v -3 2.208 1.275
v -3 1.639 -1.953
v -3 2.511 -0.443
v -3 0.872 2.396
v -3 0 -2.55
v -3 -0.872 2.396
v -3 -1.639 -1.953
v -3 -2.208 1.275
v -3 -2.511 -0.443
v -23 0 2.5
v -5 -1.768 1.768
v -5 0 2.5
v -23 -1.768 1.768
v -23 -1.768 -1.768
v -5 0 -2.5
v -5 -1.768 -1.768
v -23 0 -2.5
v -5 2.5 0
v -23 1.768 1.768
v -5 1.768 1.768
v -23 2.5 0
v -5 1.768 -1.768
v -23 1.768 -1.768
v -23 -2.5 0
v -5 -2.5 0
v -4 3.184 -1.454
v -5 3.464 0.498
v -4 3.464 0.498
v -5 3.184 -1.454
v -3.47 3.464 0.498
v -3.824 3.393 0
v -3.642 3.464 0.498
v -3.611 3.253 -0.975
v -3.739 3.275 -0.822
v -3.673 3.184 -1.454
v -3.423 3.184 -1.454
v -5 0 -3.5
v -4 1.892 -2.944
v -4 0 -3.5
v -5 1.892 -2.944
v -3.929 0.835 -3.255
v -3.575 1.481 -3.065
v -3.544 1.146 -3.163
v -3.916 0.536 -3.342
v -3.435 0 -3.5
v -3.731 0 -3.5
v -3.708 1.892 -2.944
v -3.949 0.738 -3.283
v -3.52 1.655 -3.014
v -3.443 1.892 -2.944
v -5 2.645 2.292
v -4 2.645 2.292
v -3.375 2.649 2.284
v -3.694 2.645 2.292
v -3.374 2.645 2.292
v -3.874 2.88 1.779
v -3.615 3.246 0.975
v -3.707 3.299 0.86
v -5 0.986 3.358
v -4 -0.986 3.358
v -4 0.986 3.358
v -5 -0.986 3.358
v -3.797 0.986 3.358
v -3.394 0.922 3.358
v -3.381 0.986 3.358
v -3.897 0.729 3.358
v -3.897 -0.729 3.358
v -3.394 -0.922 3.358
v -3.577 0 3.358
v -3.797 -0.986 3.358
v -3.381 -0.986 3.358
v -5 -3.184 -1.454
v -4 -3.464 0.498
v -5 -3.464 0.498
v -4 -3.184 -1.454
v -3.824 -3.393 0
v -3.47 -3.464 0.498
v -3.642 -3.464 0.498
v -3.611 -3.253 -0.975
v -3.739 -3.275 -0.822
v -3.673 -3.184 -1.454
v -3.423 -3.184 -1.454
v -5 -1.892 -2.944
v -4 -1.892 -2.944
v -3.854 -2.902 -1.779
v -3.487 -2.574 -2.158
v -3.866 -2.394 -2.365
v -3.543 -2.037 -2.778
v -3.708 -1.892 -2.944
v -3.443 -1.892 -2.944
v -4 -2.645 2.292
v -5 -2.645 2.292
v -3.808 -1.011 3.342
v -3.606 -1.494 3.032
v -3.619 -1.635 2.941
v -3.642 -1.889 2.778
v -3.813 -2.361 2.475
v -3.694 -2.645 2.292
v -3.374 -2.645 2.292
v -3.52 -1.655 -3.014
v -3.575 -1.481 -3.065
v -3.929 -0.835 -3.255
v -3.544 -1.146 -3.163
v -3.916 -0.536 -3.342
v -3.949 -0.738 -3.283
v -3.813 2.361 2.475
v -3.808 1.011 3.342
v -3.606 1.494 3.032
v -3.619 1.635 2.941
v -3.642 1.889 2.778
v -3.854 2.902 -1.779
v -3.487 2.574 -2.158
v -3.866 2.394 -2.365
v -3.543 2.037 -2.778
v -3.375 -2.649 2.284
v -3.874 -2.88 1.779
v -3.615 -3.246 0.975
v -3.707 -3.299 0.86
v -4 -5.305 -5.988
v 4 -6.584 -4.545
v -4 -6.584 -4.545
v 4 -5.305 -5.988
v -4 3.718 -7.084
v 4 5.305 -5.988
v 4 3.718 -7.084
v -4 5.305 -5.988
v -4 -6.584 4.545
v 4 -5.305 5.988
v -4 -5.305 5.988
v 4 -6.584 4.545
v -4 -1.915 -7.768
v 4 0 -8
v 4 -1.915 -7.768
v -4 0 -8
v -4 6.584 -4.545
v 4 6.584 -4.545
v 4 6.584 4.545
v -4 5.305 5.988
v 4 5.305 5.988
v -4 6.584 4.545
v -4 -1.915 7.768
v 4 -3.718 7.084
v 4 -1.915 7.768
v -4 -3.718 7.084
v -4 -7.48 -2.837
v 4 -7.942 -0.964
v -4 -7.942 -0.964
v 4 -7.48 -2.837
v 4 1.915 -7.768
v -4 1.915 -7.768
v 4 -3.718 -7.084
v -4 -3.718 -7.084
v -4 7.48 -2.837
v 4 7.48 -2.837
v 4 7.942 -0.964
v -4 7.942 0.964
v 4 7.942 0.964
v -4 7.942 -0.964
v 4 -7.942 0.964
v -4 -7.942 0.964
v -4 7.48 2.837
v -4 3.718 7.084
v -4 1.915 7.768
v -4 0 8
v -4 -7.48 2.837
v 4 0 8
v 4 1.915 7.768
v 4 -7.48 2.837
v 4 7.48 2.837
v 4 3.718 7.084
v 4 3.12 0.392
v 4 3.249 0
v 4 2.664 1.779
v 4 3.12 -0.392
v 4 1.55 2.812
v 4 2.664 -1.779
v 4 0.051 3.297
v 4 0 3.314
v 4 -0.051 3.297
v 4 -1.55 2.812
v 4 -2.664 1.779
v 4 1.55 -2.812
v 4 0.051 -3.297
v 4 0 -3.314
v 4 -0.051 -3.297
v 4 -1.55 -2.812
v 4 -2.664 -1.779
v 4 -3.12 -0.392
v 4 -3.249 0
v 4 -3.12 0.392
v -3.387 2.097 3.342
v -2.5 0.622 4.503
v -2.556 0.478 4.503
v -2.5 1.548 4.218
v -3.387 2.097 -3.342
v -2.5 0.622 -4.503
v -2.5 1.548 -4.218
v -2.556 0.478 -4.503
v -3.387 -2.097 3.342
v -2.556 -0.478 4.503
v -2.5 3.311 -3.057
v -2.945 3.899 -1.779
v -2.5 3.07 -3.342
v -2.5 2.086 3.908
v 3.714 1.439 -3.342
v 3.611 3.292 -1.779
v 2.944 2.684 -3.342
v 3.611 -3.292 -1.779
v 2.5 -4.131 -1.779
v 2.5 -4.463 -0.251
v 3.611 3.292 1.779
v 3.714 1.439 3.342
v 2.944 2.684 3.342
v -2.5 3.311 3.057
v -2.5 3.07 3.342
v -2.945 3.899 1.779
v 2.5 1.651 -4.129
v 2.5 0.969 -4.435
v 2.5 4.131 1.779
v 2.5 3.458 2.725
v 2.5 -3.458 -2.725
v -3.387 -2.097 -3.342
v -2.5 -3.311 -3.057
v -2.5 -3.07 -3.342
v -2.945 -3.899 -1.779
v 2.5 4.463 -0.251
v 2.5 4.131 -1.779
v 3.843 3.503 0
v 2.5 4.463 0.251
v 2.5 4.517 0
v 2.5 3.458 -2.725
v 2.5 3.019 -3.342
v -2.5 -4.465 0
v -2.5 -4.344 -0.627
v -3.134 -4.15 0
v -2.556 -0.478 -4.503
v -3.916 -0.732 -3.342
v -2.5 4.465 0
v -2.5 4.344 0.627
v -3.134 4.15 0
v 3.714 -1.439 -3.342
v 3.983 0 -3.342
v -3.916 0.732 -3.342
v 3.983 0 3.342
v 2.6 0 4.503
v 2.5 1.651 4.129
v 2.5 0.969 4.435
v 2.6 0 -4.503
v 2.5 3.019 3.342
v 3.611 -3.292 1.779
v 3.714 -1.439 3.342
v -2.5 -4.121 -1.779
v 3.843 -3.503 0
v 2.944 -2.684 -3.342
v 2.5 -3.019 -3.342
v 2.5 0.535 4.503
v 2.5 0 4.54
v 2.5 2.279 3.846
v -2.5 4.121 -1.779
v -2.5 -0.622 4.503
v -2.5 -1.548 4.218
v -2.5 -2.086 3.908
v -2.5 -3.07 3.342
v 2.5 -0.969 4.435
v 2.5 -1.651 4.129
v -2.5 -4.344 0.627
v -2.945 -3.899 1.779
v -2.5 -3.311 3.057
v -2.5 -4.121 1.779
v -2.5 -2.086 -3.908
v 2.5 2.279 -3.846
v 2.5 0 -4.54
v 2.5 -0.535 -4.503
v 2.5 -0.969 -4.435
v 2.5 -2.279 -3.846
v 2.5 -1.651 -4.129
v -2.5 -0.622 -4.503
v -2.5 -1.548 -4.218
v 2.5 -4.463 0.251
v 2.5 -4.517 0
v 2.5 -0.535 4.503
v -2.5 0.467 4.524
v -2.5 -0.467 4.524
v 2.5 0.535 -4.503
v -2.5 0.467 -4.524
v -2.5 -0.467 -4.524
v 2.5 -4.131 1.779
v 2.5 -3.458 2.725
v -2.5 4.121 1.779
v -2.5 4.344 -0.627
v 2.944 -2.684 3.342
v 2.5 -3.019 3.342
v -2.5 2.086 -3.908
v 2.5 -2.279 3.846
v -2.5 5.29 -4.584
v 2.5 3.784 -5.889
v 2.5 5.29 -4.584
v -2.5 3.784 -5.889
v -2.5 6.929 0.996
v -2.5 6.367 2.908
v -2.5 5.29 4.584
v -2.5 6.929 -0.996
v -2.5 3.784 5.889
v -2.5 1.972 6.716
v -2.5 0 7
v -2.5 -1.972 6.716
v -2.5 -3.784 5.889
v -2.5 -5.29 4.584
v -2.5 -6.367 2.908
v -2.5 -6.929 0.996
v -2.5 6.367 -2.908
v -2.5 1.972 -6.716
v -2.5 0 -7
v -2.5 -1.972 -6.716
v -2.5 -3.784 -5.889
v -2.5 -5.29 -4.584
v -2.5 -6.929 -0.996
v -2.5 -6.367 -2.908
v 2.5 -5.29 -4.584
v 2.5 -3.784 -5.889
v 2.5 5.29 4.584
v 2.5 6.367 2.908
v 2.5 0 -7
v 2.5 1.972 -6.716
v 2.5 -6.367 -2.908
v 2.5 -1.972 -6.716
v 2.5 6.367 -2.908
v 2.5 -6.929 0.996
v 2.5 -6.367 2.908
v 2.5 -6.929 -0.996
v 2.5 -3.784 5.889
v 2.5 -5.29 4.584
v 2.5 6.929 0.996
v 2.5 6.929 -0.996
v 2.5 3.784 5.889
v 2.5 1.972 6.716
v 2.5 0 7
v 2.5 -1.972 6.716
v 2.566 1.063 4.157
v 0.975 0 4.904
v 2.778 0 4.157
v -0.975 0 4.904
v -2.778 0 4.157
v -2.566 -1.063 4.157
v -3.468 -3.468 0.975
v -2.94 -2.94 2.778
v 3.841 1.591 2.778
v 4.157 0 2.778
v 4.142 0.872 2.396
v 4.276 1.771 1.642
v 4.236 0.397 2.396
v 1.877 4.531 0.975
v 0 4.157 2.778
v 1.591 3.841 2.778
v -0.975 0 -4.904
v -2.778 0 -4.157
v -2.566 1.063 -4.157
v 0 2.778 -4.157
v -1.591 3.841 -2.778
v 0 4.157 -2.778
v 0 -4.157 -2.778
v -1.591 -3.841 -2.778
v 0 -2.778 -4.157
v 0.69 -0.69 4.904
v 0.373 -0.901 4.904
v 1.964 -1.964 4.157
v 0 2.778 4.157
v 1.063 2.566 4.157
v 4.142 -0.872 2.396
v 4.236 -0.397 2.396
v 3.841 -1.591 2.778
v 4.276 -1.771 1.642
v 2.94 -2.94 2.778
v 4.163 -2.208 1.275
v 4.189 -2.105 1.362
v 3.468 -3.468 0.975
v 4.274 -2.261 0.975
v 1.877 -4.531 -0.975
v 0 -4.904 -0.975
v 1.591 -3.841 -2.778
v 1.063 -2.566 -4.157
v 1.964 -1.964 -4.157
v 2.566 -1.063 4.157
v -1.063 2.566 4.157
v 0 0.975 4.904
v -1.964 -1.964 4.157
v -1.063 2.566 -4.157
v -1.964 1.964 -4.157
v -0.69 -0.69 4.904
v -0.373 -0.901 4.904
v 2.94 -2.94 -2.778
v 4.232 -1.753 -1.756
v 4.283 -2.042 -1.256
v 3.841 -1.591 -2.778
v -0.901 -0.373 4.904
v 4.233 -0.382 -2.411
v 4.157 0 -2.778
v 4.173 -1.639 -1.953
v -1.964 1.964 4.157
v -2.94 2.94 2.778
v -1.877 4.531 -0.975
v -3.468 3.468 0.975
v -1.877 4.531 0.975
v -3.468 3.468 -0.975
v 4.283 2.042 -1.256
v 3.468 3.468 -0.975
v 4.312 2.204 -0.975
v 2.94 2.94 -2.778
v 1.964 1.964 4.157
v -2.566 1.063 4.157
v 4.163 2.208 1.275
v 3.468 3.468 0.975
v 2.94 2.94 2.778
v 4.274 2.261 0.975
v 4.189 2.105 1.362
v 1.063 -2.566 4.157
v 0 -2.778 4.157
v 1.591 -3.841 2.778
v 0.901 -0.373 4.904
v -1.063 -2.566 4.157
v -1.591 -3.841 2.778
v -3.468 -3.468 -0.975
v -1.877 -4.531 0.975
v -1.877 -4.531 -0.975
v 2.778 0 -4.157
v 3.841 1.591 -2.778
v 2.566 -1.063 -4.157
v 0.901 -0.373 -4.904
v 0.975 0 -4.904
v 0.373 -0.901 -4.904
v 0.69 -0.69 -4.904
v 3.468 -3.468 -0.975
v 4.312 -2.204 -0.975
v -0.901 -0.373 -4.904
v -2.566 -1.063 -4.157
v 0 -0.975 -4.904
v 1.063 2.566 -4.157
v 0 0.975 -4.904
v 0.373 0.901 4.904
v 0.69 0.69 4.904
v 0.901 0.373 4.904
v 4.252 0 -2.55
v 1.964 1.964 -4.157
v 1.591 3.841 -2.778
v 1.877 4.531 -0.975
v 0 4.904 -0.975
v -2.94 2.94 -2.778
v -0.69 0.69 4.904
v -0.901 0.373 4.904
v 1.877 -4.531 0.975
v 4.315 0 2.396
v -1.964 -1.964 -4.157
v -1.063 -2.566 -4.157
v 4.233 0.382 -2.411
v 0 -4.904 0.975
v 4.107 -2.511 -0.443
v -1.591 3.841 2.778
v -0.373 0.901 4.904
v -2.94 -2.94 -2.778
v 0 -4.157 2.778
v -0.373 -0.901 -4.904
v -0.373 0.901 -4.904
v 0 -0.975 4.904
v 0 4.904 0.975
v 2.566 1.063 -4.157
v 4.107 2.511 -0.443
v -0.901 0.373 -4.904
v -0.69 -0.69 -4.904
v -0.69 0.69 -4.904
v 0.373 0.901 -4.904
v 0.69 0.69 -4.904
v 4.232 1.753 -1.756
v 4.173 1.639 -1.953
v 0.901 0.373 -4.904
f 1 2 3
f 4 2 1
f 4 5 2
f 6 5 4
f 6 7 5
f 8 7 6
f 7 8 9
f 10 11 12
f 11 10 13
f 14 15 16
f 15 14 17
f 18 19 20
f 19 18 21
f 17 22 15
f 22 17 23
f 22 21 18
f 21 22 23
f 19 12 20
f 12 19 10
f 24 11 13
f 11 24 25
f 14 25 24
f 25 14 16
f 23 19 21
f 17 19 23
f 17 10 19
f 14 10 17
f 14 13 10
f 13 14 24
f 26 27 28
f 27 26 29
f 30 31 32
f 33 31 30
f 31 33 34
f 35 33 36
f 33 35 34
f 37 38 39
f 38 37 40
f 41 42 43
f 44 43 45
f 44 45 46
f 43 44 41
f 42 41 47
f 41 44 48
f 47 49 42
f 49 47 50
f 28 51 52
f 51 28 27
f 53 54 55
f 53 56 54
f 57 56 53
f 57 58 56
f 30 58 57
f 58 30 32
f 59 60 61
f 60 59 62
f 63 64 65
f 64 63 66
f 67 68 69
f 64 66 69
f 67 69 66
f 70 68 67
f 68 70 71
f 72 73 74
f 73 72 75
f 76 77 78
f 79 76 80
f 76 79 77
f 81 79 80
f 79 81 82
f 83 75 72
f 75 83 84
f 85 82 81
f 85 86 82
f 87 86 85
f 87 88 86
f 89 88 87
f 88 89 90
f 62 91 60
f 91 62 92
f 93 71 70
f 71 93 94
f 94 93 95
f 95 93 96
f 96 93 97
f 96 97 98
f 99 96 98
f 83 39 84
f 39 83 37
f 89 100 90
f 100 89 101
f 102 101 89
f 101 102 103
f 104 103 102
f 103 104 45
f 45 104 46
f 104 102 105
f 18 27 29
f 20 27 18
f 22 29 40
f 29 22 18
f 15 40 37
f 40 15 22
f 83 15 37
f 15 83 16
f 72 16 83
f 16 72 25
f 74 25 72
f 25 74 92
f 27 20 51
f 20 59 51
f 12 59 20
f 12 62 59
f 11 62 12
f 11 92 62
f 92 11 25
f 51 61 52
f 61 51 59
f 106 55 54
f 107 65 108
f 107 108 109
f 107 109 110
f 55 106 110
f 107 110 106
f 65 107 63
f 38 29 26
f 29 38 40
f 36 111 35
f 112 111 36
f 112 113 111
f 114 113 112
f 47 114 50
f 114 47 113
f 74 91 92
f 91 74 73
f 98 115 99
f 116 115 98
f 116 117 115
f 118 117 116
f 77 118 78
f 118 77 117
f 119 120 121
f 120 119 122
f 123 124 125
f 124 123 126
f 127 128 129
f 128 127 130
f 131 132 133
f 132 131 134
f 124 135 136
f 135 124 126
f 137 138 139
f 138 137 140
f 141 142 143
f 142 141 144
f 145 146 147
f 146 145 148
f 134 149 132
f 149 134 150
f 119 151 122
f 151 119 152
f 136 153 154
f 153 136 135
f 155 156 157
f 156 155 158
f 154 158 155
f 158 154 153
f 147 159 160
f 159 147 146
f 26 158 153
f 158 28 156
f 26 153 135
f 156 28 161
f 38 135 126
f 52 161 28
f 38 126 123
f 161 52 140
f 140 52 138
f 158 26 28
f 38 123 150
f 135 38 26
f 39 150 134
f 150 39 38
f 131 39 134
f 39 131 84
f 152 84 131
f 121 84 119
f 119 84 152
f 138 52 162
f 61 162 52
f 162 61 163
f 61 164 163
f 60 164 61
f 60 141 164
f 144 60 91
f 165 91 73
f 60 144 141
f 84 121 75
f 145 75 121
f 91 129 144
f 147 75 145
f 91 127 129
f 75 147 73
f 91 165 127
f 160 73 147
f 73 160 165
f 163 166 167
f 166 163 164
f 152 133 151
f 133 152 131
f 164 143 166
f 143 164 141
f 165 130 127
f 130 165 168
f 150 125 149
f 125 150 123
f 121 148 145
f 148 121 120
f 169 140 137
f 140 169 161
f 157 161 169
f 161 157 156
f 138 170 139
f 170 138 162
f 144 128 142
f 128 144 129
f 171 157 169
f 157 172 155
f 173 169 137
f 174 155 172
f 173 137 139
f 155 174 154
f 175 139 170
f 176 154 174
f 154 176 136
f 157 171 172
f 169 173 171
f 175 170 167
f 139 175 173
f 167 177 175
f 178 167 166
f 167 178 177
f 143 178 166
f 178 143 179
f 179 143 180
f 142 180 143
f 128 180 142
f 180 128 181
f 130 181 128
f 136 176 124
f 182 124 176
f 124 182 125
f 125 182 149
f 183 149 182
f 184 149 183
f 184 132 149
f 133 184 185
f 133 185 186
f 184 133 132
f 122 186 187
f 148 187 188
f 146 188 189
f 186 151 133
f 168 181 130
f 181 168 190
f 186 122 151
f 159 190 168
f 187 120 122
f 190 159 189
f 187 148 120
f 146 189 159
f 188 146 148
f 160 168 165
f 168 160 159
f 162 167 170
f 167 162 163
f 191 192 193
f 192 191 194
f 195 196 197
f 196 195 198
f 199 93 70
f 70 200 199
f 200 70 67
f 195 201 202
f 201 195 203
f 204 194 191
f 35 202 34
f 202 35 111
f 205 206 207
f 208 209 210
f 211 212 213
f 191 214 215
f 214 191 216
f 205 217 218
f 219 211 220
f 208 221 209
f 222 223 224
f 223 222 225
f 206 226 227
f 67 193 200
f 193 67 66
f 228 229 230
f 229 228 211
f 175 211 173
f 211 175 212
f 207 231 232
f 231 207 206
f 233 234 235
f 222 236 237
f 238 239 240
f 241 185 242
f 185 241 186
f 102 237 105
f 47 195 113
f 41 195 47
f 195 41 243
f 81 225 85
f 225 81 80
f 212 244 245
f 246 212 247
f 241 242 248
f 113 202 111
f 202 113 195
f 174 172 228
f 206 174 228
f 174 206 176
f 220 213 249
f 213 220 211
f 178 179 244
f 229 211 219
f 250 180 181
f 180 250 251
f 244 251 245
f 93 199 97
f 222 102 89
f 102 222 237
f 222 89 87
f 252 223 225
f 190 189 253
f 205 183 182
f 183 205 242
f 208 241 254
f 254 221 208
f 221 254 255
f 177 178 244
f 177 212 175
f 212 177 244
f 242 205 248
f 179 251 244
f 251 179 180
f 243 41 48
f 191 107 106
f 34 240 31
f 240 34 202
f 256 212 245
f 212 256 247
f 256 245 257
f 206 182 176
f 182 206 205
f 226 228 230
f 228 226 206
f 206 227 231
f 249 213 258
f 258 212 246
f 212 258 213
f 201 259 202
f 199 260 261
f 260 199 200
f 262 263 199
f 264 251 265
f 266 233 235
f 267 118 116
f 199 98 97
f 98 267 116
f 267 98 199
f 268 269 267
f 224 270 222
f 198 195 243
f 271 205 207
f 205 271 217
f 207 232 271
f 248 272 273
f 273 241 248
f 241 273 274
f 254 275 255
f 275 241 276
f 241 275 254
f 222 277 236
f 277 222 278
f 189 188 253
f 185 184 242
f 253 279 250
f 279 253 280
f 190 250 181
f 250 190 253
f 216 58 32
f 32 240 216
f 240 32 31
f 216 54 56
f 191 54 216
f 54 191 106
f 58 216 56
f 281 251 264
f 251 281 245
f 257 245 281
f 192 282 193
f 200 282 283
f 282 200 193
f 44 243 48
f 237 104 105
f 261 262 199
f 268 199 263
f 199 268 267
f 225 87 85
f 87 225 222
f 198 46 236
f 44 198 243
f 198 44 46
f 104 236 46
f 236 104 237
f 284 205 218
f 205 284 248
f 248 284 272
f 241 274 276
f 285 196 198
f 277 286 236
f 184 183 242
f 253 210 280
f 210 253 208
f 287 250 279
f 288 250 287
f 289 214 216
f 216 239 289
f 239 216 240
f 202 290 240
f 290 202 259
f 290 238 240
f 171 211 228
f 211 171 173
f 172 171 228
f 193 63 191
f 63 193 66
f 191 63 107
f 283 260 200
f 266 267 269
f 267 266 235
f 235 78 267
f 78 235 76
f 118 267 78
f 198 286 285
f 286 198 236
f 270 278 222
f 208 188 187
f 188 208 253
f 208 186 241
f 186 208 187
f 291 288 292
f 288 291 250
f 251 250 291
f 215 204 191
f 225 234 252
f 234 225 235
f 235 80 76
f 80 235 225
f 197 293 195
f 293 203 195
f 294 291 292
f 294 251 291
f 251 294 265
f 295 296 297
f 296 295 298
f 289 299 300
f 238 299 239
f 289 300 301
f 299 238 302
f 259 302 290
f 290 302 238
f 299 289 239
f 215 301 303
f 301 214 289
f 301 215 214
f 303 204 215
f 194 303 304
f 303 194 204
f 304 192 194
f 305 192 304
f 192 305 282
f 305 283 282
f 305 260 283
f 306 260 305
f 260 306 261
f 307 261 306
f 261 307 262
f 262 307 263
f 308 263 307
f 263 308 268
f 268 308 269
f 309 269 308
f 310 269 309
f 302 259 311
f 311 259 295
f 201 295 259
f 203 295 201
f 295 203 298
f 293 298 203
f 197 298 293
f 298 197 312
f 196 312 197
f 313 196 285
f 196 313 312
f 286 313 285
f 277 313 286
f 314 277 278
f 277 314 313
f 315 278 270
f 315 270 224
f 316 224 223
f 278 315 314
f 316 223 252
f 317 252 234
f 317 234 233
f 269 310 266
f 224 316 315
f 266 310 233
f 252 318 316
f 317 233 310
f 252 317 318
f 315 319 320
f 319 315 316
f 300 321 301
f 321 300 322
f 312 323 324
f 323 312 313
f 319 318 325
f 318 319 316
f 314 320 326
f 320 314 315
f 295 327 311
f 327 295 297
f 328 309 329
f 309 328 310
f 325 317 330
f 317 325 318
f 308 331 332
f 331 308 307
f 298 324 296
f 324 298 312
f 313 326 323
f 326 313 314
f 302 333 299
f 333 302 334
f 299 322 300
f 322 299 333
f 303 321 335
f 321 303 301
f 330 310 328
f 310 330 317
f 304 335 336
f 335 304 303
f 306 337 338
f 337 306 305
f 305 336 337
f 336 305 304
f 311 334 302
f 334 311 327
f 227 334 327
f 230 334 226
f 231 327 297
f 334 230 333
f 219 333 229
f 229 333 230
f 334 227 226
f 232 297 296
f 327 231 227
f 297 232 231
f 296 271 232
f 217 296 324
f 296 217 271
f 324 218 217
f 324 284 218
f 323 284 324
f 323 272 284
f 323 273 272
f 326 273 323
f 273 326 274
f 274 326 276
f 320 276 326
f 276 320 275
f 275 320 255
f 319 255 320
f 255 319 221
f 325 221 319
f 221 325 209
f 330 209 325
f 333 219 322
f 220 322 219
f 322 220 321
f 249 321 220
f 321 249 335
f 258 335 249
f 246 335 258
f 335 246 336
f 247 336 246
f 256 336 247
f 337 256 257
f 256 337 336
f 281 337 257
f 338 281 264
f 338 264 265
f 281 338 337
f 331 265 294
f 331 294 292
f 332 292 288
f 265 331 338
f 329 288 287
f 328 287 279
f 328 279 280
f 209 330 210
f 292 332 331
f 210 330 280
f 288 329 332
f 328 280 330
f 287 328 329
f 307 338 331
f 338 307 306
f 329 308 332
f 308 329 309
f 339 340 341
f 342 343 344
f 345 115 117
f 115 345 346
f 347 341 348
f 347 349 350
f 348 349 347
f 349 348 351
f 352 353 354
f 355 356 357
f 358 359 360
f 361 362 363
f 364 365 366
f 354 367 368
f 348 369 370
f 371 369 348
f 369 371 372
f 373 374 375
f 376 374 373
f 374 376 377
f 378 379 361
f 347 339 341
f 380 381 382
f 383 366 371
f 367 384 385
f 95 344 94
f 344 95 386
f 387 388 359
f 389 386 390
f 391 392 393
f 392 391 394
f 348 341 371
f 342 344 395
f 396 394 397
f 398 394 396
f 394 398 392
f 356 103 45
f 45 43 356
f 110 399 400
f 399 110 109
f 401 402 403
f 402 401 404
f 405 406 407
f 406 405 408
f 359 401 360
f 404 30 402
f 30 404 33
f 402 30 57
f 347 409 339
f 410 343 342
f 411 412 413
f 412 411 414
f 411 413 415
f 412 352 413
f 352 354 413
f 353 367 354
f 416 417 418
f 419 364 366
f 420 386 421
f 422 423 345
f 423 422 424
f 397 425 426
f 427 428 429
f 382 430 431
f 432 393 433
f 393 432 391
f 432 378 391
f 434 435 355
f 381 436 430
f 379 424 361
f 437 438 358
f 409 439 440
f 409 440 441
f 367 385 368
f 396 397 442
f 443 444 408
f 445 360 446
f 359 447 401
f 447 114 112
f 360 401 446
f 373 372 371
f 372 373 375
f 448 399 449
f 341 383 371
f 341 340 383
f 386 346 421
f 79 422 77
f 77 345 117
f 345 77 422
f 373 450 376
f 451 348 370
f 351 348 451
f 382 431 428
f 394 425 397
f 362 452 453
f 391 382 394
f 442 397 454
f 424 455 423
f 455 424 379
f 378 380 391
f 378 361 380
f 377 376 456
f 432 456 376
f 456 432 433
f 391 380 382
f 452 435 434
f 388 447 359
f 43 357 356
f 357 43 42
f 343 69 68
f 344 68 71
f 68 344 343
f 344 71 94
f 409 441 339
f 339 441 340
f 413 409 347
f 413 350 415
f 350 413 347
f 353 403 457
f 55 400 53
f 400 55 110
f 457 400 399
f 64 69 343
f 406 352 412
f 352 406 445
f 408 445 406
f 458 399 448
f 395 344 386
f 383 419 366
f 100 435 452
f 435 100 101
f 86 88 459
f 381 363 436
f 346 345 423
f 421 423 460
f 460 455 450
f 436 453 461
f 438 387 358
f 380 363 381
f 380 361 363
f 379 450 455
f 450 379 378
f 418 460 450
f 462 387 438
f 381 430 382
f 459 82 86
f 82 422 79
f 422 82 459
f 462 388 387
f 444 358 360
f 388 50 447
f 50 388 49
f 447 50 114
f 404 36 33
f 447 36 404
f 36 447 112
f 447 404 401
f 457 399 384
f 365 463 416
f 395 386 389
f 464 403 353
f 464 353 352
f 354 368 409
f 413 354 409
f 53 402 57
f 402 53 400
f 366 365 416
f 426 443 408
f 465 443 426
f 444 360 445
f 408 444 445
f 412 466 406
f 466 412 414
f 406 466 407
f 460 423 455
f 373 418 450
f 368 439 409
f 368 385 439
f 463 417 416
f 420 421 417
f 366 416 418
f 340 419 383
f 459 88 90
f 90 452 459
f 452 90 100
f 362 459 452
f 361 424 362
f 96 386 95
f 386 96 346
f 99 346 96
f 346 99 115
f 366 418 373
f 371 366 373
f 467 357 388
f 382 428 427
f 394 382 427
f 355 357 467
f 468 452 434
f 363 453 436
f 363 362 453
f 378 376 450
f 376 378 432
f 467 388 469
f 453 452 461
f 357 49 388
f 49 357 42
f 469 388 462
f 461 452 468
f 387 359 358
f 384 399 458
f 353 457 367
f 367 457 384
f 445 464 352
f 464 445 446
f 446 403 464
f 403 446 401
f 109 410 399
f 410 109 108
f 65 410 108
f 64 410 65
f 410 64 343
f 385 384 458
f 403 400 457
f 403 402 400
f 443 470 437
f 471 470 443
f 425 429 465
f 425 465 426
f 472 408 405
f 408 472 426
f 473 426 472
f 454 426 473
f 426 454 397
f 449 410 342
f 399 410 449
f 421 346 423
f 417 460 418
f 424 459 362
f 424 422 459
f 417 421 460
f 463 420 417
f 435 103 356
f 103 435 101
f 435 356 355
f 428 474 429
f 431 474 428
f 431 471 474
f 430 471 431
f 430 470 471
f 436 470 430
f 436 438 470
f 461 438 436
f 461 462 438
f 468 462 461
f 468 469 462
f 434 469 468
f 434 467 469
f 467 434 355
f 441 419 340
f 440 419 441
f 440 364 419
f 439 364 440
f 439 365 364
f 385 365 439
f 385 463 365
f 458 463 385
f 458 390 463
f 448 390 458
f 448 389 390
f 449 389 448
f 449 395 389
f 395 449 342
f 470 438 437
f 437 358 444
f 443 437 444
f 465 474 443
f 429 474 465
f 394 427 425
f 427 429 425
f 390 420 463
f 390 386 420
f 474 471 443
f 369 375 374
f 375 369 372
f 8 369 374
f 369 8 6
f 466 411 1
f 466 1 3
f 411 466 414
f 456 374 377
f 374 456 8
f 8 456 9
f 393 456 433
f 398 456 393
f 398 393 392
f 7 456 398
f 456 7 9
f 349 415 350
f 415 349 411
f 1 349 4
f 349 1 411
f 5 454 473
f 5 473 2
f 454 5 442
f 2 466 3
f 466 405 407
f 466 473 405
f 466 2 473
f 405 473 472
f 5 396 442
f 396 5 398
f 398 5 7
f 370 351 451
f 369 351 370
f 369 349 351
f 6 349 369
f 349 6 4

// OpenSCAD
// Parameters
thread_nominal_diameter_mm = 5; //[2.5:10:0.1]
thread_pitch_mm = 0.8; //[0.4:1.6:0.05]
shank_thread_length_mm = 12; //[6:24:0.5]
shank_unthreaded_length_mm = 0; //[0:10:0.5]
shank_total_length_mm = 20; //[10:40:0.5]
shank_major_diameter_mm = 5; //[2.5:10:0.1]
shank_minor_diameter_mm = 4.2; //[2:9:0.1]
shoulder_diameter_mm = 7; //[3.5:14:0.1]
shoulder_length_mm = 2; //[1:6:0.1]
eye_outer_diameter_mm = 16; //[8:32:0.5]
eye_width_mm = 8; //[4:16:0.5]
ball_outer_diameter_mm = 10; //[5:20:0.2]
ball_bore_diameter_mm = 5.1; //[2.5:12:0.1]
rim_thickness_mm = 1.5; //[0.8:3:0.1]
housing_wall_min_mm = 2; //[1:5:0.1]
edge_chamfer_mm = 0.5; //[0.2:2:0.1]
centered_model = 1; //[0:1:1]
overlap_mm = 1; //[0.5:2:0.1]
eye_bore_clearance_mm = 0.2; //[0.05:0.6:0.05]
lip_radial_mm = 0.6; //[0.3:1.5:0.1]
lip_axial_mm = 0.8; //[0.4:2:0.1]

// Rod - Detailed geometry
module rod() {
  color("Silver") {
    // Shank
    translate([-(eye_width_mm/2 + shank_total_length_mm/2 - overlap_mm), 0, 0])
      rotate([0, 90, 0])
      cylinder(r=shank_major_diameter_mm/2, h=shank_total_length_mm, center=true);
    // Threaded portion
    translate([-(eye_width_mm/2 + shank_total_length_mm - shank_thread_length_mm/2 - overlap_mm), 0, 0])
      rotate([0, 90, 0])
      cylinder(r=shank_major_diameter_mm/2, h=shank_thread_length_mm, center=true);
    // Shoulder transition
    translate([-(eye_width_mm/2 + shoulder_length_mm/2 - overlap_mm), 0, 0])
      rotate([0, 90, 0])
      cylinder(r=shoulder_diameter_mm/2, h=shoulder_length_mm, center=true);
  }
}

// Rod End Bearing - Detailed geometry
module rod_end_bearing() {
  color("DimGray") {
    // Eye housing with retention lips
    difference() {
      union() {
        // Eye outer profile
        translate([0, 0, 0])
          rotate([0, 90, 0])
          cylinder(r=eye_outer_diameter_mm/2, h=eye_width_mm, center=true);
        // Retention lips
        translate([-(eye_width_mm/2 - lip_axial_mm/2 - overlap_mm), 0, 0])
          rotate([0, 90, 0])
          cylinder(r=ball_outer_diameter_mm/2 + eye_bore_clearance_mm - lip_radial_mm, h=lip_axial_mm, center=true);
        translate([(eye_width_mm/2 - lip_axial_mm/2 - overlap_mm), 0, 0])
          rotate([0, 90, 0])
          cylinder(r=ball_outer_diameter_mm/2 + eye_bore_clearance_mm - lip_radial_mm, h=lip_axial_mm, center=true);
      }
      // Spherical seat cavity
      translate([0, 0, 0])
        sphere(r=ball_outer_diameter_mm/2 + eye_bore_clearance_mm, center=true);
      // Side opening cut
      translate([0, 0, 0])
        rotate([0, 90, 0])
        cylinder(r=ball_outer_diameter_mm/2 + housing_wall_min_mm, h=eye_width_mm - 2*rim_thickness_mm, center=true);
    }
    // Spherical bearing insert with bore
    difference() {
      translate([0, 0, 0])
        sphere(r=ball_outer_diameter_mm/2, center=true);
      translate([0, 0, 0])
        rotate([0, 90, 0])
        cylinder(r=ball_bore_diameter_mm/2, h=ball_outer_diameter_mm + 2*overlap_mm, center=true);
    }
  }
}

// Assembly
module assembly() {
  rod();
  rod_end_bearing();
}

assembly();
